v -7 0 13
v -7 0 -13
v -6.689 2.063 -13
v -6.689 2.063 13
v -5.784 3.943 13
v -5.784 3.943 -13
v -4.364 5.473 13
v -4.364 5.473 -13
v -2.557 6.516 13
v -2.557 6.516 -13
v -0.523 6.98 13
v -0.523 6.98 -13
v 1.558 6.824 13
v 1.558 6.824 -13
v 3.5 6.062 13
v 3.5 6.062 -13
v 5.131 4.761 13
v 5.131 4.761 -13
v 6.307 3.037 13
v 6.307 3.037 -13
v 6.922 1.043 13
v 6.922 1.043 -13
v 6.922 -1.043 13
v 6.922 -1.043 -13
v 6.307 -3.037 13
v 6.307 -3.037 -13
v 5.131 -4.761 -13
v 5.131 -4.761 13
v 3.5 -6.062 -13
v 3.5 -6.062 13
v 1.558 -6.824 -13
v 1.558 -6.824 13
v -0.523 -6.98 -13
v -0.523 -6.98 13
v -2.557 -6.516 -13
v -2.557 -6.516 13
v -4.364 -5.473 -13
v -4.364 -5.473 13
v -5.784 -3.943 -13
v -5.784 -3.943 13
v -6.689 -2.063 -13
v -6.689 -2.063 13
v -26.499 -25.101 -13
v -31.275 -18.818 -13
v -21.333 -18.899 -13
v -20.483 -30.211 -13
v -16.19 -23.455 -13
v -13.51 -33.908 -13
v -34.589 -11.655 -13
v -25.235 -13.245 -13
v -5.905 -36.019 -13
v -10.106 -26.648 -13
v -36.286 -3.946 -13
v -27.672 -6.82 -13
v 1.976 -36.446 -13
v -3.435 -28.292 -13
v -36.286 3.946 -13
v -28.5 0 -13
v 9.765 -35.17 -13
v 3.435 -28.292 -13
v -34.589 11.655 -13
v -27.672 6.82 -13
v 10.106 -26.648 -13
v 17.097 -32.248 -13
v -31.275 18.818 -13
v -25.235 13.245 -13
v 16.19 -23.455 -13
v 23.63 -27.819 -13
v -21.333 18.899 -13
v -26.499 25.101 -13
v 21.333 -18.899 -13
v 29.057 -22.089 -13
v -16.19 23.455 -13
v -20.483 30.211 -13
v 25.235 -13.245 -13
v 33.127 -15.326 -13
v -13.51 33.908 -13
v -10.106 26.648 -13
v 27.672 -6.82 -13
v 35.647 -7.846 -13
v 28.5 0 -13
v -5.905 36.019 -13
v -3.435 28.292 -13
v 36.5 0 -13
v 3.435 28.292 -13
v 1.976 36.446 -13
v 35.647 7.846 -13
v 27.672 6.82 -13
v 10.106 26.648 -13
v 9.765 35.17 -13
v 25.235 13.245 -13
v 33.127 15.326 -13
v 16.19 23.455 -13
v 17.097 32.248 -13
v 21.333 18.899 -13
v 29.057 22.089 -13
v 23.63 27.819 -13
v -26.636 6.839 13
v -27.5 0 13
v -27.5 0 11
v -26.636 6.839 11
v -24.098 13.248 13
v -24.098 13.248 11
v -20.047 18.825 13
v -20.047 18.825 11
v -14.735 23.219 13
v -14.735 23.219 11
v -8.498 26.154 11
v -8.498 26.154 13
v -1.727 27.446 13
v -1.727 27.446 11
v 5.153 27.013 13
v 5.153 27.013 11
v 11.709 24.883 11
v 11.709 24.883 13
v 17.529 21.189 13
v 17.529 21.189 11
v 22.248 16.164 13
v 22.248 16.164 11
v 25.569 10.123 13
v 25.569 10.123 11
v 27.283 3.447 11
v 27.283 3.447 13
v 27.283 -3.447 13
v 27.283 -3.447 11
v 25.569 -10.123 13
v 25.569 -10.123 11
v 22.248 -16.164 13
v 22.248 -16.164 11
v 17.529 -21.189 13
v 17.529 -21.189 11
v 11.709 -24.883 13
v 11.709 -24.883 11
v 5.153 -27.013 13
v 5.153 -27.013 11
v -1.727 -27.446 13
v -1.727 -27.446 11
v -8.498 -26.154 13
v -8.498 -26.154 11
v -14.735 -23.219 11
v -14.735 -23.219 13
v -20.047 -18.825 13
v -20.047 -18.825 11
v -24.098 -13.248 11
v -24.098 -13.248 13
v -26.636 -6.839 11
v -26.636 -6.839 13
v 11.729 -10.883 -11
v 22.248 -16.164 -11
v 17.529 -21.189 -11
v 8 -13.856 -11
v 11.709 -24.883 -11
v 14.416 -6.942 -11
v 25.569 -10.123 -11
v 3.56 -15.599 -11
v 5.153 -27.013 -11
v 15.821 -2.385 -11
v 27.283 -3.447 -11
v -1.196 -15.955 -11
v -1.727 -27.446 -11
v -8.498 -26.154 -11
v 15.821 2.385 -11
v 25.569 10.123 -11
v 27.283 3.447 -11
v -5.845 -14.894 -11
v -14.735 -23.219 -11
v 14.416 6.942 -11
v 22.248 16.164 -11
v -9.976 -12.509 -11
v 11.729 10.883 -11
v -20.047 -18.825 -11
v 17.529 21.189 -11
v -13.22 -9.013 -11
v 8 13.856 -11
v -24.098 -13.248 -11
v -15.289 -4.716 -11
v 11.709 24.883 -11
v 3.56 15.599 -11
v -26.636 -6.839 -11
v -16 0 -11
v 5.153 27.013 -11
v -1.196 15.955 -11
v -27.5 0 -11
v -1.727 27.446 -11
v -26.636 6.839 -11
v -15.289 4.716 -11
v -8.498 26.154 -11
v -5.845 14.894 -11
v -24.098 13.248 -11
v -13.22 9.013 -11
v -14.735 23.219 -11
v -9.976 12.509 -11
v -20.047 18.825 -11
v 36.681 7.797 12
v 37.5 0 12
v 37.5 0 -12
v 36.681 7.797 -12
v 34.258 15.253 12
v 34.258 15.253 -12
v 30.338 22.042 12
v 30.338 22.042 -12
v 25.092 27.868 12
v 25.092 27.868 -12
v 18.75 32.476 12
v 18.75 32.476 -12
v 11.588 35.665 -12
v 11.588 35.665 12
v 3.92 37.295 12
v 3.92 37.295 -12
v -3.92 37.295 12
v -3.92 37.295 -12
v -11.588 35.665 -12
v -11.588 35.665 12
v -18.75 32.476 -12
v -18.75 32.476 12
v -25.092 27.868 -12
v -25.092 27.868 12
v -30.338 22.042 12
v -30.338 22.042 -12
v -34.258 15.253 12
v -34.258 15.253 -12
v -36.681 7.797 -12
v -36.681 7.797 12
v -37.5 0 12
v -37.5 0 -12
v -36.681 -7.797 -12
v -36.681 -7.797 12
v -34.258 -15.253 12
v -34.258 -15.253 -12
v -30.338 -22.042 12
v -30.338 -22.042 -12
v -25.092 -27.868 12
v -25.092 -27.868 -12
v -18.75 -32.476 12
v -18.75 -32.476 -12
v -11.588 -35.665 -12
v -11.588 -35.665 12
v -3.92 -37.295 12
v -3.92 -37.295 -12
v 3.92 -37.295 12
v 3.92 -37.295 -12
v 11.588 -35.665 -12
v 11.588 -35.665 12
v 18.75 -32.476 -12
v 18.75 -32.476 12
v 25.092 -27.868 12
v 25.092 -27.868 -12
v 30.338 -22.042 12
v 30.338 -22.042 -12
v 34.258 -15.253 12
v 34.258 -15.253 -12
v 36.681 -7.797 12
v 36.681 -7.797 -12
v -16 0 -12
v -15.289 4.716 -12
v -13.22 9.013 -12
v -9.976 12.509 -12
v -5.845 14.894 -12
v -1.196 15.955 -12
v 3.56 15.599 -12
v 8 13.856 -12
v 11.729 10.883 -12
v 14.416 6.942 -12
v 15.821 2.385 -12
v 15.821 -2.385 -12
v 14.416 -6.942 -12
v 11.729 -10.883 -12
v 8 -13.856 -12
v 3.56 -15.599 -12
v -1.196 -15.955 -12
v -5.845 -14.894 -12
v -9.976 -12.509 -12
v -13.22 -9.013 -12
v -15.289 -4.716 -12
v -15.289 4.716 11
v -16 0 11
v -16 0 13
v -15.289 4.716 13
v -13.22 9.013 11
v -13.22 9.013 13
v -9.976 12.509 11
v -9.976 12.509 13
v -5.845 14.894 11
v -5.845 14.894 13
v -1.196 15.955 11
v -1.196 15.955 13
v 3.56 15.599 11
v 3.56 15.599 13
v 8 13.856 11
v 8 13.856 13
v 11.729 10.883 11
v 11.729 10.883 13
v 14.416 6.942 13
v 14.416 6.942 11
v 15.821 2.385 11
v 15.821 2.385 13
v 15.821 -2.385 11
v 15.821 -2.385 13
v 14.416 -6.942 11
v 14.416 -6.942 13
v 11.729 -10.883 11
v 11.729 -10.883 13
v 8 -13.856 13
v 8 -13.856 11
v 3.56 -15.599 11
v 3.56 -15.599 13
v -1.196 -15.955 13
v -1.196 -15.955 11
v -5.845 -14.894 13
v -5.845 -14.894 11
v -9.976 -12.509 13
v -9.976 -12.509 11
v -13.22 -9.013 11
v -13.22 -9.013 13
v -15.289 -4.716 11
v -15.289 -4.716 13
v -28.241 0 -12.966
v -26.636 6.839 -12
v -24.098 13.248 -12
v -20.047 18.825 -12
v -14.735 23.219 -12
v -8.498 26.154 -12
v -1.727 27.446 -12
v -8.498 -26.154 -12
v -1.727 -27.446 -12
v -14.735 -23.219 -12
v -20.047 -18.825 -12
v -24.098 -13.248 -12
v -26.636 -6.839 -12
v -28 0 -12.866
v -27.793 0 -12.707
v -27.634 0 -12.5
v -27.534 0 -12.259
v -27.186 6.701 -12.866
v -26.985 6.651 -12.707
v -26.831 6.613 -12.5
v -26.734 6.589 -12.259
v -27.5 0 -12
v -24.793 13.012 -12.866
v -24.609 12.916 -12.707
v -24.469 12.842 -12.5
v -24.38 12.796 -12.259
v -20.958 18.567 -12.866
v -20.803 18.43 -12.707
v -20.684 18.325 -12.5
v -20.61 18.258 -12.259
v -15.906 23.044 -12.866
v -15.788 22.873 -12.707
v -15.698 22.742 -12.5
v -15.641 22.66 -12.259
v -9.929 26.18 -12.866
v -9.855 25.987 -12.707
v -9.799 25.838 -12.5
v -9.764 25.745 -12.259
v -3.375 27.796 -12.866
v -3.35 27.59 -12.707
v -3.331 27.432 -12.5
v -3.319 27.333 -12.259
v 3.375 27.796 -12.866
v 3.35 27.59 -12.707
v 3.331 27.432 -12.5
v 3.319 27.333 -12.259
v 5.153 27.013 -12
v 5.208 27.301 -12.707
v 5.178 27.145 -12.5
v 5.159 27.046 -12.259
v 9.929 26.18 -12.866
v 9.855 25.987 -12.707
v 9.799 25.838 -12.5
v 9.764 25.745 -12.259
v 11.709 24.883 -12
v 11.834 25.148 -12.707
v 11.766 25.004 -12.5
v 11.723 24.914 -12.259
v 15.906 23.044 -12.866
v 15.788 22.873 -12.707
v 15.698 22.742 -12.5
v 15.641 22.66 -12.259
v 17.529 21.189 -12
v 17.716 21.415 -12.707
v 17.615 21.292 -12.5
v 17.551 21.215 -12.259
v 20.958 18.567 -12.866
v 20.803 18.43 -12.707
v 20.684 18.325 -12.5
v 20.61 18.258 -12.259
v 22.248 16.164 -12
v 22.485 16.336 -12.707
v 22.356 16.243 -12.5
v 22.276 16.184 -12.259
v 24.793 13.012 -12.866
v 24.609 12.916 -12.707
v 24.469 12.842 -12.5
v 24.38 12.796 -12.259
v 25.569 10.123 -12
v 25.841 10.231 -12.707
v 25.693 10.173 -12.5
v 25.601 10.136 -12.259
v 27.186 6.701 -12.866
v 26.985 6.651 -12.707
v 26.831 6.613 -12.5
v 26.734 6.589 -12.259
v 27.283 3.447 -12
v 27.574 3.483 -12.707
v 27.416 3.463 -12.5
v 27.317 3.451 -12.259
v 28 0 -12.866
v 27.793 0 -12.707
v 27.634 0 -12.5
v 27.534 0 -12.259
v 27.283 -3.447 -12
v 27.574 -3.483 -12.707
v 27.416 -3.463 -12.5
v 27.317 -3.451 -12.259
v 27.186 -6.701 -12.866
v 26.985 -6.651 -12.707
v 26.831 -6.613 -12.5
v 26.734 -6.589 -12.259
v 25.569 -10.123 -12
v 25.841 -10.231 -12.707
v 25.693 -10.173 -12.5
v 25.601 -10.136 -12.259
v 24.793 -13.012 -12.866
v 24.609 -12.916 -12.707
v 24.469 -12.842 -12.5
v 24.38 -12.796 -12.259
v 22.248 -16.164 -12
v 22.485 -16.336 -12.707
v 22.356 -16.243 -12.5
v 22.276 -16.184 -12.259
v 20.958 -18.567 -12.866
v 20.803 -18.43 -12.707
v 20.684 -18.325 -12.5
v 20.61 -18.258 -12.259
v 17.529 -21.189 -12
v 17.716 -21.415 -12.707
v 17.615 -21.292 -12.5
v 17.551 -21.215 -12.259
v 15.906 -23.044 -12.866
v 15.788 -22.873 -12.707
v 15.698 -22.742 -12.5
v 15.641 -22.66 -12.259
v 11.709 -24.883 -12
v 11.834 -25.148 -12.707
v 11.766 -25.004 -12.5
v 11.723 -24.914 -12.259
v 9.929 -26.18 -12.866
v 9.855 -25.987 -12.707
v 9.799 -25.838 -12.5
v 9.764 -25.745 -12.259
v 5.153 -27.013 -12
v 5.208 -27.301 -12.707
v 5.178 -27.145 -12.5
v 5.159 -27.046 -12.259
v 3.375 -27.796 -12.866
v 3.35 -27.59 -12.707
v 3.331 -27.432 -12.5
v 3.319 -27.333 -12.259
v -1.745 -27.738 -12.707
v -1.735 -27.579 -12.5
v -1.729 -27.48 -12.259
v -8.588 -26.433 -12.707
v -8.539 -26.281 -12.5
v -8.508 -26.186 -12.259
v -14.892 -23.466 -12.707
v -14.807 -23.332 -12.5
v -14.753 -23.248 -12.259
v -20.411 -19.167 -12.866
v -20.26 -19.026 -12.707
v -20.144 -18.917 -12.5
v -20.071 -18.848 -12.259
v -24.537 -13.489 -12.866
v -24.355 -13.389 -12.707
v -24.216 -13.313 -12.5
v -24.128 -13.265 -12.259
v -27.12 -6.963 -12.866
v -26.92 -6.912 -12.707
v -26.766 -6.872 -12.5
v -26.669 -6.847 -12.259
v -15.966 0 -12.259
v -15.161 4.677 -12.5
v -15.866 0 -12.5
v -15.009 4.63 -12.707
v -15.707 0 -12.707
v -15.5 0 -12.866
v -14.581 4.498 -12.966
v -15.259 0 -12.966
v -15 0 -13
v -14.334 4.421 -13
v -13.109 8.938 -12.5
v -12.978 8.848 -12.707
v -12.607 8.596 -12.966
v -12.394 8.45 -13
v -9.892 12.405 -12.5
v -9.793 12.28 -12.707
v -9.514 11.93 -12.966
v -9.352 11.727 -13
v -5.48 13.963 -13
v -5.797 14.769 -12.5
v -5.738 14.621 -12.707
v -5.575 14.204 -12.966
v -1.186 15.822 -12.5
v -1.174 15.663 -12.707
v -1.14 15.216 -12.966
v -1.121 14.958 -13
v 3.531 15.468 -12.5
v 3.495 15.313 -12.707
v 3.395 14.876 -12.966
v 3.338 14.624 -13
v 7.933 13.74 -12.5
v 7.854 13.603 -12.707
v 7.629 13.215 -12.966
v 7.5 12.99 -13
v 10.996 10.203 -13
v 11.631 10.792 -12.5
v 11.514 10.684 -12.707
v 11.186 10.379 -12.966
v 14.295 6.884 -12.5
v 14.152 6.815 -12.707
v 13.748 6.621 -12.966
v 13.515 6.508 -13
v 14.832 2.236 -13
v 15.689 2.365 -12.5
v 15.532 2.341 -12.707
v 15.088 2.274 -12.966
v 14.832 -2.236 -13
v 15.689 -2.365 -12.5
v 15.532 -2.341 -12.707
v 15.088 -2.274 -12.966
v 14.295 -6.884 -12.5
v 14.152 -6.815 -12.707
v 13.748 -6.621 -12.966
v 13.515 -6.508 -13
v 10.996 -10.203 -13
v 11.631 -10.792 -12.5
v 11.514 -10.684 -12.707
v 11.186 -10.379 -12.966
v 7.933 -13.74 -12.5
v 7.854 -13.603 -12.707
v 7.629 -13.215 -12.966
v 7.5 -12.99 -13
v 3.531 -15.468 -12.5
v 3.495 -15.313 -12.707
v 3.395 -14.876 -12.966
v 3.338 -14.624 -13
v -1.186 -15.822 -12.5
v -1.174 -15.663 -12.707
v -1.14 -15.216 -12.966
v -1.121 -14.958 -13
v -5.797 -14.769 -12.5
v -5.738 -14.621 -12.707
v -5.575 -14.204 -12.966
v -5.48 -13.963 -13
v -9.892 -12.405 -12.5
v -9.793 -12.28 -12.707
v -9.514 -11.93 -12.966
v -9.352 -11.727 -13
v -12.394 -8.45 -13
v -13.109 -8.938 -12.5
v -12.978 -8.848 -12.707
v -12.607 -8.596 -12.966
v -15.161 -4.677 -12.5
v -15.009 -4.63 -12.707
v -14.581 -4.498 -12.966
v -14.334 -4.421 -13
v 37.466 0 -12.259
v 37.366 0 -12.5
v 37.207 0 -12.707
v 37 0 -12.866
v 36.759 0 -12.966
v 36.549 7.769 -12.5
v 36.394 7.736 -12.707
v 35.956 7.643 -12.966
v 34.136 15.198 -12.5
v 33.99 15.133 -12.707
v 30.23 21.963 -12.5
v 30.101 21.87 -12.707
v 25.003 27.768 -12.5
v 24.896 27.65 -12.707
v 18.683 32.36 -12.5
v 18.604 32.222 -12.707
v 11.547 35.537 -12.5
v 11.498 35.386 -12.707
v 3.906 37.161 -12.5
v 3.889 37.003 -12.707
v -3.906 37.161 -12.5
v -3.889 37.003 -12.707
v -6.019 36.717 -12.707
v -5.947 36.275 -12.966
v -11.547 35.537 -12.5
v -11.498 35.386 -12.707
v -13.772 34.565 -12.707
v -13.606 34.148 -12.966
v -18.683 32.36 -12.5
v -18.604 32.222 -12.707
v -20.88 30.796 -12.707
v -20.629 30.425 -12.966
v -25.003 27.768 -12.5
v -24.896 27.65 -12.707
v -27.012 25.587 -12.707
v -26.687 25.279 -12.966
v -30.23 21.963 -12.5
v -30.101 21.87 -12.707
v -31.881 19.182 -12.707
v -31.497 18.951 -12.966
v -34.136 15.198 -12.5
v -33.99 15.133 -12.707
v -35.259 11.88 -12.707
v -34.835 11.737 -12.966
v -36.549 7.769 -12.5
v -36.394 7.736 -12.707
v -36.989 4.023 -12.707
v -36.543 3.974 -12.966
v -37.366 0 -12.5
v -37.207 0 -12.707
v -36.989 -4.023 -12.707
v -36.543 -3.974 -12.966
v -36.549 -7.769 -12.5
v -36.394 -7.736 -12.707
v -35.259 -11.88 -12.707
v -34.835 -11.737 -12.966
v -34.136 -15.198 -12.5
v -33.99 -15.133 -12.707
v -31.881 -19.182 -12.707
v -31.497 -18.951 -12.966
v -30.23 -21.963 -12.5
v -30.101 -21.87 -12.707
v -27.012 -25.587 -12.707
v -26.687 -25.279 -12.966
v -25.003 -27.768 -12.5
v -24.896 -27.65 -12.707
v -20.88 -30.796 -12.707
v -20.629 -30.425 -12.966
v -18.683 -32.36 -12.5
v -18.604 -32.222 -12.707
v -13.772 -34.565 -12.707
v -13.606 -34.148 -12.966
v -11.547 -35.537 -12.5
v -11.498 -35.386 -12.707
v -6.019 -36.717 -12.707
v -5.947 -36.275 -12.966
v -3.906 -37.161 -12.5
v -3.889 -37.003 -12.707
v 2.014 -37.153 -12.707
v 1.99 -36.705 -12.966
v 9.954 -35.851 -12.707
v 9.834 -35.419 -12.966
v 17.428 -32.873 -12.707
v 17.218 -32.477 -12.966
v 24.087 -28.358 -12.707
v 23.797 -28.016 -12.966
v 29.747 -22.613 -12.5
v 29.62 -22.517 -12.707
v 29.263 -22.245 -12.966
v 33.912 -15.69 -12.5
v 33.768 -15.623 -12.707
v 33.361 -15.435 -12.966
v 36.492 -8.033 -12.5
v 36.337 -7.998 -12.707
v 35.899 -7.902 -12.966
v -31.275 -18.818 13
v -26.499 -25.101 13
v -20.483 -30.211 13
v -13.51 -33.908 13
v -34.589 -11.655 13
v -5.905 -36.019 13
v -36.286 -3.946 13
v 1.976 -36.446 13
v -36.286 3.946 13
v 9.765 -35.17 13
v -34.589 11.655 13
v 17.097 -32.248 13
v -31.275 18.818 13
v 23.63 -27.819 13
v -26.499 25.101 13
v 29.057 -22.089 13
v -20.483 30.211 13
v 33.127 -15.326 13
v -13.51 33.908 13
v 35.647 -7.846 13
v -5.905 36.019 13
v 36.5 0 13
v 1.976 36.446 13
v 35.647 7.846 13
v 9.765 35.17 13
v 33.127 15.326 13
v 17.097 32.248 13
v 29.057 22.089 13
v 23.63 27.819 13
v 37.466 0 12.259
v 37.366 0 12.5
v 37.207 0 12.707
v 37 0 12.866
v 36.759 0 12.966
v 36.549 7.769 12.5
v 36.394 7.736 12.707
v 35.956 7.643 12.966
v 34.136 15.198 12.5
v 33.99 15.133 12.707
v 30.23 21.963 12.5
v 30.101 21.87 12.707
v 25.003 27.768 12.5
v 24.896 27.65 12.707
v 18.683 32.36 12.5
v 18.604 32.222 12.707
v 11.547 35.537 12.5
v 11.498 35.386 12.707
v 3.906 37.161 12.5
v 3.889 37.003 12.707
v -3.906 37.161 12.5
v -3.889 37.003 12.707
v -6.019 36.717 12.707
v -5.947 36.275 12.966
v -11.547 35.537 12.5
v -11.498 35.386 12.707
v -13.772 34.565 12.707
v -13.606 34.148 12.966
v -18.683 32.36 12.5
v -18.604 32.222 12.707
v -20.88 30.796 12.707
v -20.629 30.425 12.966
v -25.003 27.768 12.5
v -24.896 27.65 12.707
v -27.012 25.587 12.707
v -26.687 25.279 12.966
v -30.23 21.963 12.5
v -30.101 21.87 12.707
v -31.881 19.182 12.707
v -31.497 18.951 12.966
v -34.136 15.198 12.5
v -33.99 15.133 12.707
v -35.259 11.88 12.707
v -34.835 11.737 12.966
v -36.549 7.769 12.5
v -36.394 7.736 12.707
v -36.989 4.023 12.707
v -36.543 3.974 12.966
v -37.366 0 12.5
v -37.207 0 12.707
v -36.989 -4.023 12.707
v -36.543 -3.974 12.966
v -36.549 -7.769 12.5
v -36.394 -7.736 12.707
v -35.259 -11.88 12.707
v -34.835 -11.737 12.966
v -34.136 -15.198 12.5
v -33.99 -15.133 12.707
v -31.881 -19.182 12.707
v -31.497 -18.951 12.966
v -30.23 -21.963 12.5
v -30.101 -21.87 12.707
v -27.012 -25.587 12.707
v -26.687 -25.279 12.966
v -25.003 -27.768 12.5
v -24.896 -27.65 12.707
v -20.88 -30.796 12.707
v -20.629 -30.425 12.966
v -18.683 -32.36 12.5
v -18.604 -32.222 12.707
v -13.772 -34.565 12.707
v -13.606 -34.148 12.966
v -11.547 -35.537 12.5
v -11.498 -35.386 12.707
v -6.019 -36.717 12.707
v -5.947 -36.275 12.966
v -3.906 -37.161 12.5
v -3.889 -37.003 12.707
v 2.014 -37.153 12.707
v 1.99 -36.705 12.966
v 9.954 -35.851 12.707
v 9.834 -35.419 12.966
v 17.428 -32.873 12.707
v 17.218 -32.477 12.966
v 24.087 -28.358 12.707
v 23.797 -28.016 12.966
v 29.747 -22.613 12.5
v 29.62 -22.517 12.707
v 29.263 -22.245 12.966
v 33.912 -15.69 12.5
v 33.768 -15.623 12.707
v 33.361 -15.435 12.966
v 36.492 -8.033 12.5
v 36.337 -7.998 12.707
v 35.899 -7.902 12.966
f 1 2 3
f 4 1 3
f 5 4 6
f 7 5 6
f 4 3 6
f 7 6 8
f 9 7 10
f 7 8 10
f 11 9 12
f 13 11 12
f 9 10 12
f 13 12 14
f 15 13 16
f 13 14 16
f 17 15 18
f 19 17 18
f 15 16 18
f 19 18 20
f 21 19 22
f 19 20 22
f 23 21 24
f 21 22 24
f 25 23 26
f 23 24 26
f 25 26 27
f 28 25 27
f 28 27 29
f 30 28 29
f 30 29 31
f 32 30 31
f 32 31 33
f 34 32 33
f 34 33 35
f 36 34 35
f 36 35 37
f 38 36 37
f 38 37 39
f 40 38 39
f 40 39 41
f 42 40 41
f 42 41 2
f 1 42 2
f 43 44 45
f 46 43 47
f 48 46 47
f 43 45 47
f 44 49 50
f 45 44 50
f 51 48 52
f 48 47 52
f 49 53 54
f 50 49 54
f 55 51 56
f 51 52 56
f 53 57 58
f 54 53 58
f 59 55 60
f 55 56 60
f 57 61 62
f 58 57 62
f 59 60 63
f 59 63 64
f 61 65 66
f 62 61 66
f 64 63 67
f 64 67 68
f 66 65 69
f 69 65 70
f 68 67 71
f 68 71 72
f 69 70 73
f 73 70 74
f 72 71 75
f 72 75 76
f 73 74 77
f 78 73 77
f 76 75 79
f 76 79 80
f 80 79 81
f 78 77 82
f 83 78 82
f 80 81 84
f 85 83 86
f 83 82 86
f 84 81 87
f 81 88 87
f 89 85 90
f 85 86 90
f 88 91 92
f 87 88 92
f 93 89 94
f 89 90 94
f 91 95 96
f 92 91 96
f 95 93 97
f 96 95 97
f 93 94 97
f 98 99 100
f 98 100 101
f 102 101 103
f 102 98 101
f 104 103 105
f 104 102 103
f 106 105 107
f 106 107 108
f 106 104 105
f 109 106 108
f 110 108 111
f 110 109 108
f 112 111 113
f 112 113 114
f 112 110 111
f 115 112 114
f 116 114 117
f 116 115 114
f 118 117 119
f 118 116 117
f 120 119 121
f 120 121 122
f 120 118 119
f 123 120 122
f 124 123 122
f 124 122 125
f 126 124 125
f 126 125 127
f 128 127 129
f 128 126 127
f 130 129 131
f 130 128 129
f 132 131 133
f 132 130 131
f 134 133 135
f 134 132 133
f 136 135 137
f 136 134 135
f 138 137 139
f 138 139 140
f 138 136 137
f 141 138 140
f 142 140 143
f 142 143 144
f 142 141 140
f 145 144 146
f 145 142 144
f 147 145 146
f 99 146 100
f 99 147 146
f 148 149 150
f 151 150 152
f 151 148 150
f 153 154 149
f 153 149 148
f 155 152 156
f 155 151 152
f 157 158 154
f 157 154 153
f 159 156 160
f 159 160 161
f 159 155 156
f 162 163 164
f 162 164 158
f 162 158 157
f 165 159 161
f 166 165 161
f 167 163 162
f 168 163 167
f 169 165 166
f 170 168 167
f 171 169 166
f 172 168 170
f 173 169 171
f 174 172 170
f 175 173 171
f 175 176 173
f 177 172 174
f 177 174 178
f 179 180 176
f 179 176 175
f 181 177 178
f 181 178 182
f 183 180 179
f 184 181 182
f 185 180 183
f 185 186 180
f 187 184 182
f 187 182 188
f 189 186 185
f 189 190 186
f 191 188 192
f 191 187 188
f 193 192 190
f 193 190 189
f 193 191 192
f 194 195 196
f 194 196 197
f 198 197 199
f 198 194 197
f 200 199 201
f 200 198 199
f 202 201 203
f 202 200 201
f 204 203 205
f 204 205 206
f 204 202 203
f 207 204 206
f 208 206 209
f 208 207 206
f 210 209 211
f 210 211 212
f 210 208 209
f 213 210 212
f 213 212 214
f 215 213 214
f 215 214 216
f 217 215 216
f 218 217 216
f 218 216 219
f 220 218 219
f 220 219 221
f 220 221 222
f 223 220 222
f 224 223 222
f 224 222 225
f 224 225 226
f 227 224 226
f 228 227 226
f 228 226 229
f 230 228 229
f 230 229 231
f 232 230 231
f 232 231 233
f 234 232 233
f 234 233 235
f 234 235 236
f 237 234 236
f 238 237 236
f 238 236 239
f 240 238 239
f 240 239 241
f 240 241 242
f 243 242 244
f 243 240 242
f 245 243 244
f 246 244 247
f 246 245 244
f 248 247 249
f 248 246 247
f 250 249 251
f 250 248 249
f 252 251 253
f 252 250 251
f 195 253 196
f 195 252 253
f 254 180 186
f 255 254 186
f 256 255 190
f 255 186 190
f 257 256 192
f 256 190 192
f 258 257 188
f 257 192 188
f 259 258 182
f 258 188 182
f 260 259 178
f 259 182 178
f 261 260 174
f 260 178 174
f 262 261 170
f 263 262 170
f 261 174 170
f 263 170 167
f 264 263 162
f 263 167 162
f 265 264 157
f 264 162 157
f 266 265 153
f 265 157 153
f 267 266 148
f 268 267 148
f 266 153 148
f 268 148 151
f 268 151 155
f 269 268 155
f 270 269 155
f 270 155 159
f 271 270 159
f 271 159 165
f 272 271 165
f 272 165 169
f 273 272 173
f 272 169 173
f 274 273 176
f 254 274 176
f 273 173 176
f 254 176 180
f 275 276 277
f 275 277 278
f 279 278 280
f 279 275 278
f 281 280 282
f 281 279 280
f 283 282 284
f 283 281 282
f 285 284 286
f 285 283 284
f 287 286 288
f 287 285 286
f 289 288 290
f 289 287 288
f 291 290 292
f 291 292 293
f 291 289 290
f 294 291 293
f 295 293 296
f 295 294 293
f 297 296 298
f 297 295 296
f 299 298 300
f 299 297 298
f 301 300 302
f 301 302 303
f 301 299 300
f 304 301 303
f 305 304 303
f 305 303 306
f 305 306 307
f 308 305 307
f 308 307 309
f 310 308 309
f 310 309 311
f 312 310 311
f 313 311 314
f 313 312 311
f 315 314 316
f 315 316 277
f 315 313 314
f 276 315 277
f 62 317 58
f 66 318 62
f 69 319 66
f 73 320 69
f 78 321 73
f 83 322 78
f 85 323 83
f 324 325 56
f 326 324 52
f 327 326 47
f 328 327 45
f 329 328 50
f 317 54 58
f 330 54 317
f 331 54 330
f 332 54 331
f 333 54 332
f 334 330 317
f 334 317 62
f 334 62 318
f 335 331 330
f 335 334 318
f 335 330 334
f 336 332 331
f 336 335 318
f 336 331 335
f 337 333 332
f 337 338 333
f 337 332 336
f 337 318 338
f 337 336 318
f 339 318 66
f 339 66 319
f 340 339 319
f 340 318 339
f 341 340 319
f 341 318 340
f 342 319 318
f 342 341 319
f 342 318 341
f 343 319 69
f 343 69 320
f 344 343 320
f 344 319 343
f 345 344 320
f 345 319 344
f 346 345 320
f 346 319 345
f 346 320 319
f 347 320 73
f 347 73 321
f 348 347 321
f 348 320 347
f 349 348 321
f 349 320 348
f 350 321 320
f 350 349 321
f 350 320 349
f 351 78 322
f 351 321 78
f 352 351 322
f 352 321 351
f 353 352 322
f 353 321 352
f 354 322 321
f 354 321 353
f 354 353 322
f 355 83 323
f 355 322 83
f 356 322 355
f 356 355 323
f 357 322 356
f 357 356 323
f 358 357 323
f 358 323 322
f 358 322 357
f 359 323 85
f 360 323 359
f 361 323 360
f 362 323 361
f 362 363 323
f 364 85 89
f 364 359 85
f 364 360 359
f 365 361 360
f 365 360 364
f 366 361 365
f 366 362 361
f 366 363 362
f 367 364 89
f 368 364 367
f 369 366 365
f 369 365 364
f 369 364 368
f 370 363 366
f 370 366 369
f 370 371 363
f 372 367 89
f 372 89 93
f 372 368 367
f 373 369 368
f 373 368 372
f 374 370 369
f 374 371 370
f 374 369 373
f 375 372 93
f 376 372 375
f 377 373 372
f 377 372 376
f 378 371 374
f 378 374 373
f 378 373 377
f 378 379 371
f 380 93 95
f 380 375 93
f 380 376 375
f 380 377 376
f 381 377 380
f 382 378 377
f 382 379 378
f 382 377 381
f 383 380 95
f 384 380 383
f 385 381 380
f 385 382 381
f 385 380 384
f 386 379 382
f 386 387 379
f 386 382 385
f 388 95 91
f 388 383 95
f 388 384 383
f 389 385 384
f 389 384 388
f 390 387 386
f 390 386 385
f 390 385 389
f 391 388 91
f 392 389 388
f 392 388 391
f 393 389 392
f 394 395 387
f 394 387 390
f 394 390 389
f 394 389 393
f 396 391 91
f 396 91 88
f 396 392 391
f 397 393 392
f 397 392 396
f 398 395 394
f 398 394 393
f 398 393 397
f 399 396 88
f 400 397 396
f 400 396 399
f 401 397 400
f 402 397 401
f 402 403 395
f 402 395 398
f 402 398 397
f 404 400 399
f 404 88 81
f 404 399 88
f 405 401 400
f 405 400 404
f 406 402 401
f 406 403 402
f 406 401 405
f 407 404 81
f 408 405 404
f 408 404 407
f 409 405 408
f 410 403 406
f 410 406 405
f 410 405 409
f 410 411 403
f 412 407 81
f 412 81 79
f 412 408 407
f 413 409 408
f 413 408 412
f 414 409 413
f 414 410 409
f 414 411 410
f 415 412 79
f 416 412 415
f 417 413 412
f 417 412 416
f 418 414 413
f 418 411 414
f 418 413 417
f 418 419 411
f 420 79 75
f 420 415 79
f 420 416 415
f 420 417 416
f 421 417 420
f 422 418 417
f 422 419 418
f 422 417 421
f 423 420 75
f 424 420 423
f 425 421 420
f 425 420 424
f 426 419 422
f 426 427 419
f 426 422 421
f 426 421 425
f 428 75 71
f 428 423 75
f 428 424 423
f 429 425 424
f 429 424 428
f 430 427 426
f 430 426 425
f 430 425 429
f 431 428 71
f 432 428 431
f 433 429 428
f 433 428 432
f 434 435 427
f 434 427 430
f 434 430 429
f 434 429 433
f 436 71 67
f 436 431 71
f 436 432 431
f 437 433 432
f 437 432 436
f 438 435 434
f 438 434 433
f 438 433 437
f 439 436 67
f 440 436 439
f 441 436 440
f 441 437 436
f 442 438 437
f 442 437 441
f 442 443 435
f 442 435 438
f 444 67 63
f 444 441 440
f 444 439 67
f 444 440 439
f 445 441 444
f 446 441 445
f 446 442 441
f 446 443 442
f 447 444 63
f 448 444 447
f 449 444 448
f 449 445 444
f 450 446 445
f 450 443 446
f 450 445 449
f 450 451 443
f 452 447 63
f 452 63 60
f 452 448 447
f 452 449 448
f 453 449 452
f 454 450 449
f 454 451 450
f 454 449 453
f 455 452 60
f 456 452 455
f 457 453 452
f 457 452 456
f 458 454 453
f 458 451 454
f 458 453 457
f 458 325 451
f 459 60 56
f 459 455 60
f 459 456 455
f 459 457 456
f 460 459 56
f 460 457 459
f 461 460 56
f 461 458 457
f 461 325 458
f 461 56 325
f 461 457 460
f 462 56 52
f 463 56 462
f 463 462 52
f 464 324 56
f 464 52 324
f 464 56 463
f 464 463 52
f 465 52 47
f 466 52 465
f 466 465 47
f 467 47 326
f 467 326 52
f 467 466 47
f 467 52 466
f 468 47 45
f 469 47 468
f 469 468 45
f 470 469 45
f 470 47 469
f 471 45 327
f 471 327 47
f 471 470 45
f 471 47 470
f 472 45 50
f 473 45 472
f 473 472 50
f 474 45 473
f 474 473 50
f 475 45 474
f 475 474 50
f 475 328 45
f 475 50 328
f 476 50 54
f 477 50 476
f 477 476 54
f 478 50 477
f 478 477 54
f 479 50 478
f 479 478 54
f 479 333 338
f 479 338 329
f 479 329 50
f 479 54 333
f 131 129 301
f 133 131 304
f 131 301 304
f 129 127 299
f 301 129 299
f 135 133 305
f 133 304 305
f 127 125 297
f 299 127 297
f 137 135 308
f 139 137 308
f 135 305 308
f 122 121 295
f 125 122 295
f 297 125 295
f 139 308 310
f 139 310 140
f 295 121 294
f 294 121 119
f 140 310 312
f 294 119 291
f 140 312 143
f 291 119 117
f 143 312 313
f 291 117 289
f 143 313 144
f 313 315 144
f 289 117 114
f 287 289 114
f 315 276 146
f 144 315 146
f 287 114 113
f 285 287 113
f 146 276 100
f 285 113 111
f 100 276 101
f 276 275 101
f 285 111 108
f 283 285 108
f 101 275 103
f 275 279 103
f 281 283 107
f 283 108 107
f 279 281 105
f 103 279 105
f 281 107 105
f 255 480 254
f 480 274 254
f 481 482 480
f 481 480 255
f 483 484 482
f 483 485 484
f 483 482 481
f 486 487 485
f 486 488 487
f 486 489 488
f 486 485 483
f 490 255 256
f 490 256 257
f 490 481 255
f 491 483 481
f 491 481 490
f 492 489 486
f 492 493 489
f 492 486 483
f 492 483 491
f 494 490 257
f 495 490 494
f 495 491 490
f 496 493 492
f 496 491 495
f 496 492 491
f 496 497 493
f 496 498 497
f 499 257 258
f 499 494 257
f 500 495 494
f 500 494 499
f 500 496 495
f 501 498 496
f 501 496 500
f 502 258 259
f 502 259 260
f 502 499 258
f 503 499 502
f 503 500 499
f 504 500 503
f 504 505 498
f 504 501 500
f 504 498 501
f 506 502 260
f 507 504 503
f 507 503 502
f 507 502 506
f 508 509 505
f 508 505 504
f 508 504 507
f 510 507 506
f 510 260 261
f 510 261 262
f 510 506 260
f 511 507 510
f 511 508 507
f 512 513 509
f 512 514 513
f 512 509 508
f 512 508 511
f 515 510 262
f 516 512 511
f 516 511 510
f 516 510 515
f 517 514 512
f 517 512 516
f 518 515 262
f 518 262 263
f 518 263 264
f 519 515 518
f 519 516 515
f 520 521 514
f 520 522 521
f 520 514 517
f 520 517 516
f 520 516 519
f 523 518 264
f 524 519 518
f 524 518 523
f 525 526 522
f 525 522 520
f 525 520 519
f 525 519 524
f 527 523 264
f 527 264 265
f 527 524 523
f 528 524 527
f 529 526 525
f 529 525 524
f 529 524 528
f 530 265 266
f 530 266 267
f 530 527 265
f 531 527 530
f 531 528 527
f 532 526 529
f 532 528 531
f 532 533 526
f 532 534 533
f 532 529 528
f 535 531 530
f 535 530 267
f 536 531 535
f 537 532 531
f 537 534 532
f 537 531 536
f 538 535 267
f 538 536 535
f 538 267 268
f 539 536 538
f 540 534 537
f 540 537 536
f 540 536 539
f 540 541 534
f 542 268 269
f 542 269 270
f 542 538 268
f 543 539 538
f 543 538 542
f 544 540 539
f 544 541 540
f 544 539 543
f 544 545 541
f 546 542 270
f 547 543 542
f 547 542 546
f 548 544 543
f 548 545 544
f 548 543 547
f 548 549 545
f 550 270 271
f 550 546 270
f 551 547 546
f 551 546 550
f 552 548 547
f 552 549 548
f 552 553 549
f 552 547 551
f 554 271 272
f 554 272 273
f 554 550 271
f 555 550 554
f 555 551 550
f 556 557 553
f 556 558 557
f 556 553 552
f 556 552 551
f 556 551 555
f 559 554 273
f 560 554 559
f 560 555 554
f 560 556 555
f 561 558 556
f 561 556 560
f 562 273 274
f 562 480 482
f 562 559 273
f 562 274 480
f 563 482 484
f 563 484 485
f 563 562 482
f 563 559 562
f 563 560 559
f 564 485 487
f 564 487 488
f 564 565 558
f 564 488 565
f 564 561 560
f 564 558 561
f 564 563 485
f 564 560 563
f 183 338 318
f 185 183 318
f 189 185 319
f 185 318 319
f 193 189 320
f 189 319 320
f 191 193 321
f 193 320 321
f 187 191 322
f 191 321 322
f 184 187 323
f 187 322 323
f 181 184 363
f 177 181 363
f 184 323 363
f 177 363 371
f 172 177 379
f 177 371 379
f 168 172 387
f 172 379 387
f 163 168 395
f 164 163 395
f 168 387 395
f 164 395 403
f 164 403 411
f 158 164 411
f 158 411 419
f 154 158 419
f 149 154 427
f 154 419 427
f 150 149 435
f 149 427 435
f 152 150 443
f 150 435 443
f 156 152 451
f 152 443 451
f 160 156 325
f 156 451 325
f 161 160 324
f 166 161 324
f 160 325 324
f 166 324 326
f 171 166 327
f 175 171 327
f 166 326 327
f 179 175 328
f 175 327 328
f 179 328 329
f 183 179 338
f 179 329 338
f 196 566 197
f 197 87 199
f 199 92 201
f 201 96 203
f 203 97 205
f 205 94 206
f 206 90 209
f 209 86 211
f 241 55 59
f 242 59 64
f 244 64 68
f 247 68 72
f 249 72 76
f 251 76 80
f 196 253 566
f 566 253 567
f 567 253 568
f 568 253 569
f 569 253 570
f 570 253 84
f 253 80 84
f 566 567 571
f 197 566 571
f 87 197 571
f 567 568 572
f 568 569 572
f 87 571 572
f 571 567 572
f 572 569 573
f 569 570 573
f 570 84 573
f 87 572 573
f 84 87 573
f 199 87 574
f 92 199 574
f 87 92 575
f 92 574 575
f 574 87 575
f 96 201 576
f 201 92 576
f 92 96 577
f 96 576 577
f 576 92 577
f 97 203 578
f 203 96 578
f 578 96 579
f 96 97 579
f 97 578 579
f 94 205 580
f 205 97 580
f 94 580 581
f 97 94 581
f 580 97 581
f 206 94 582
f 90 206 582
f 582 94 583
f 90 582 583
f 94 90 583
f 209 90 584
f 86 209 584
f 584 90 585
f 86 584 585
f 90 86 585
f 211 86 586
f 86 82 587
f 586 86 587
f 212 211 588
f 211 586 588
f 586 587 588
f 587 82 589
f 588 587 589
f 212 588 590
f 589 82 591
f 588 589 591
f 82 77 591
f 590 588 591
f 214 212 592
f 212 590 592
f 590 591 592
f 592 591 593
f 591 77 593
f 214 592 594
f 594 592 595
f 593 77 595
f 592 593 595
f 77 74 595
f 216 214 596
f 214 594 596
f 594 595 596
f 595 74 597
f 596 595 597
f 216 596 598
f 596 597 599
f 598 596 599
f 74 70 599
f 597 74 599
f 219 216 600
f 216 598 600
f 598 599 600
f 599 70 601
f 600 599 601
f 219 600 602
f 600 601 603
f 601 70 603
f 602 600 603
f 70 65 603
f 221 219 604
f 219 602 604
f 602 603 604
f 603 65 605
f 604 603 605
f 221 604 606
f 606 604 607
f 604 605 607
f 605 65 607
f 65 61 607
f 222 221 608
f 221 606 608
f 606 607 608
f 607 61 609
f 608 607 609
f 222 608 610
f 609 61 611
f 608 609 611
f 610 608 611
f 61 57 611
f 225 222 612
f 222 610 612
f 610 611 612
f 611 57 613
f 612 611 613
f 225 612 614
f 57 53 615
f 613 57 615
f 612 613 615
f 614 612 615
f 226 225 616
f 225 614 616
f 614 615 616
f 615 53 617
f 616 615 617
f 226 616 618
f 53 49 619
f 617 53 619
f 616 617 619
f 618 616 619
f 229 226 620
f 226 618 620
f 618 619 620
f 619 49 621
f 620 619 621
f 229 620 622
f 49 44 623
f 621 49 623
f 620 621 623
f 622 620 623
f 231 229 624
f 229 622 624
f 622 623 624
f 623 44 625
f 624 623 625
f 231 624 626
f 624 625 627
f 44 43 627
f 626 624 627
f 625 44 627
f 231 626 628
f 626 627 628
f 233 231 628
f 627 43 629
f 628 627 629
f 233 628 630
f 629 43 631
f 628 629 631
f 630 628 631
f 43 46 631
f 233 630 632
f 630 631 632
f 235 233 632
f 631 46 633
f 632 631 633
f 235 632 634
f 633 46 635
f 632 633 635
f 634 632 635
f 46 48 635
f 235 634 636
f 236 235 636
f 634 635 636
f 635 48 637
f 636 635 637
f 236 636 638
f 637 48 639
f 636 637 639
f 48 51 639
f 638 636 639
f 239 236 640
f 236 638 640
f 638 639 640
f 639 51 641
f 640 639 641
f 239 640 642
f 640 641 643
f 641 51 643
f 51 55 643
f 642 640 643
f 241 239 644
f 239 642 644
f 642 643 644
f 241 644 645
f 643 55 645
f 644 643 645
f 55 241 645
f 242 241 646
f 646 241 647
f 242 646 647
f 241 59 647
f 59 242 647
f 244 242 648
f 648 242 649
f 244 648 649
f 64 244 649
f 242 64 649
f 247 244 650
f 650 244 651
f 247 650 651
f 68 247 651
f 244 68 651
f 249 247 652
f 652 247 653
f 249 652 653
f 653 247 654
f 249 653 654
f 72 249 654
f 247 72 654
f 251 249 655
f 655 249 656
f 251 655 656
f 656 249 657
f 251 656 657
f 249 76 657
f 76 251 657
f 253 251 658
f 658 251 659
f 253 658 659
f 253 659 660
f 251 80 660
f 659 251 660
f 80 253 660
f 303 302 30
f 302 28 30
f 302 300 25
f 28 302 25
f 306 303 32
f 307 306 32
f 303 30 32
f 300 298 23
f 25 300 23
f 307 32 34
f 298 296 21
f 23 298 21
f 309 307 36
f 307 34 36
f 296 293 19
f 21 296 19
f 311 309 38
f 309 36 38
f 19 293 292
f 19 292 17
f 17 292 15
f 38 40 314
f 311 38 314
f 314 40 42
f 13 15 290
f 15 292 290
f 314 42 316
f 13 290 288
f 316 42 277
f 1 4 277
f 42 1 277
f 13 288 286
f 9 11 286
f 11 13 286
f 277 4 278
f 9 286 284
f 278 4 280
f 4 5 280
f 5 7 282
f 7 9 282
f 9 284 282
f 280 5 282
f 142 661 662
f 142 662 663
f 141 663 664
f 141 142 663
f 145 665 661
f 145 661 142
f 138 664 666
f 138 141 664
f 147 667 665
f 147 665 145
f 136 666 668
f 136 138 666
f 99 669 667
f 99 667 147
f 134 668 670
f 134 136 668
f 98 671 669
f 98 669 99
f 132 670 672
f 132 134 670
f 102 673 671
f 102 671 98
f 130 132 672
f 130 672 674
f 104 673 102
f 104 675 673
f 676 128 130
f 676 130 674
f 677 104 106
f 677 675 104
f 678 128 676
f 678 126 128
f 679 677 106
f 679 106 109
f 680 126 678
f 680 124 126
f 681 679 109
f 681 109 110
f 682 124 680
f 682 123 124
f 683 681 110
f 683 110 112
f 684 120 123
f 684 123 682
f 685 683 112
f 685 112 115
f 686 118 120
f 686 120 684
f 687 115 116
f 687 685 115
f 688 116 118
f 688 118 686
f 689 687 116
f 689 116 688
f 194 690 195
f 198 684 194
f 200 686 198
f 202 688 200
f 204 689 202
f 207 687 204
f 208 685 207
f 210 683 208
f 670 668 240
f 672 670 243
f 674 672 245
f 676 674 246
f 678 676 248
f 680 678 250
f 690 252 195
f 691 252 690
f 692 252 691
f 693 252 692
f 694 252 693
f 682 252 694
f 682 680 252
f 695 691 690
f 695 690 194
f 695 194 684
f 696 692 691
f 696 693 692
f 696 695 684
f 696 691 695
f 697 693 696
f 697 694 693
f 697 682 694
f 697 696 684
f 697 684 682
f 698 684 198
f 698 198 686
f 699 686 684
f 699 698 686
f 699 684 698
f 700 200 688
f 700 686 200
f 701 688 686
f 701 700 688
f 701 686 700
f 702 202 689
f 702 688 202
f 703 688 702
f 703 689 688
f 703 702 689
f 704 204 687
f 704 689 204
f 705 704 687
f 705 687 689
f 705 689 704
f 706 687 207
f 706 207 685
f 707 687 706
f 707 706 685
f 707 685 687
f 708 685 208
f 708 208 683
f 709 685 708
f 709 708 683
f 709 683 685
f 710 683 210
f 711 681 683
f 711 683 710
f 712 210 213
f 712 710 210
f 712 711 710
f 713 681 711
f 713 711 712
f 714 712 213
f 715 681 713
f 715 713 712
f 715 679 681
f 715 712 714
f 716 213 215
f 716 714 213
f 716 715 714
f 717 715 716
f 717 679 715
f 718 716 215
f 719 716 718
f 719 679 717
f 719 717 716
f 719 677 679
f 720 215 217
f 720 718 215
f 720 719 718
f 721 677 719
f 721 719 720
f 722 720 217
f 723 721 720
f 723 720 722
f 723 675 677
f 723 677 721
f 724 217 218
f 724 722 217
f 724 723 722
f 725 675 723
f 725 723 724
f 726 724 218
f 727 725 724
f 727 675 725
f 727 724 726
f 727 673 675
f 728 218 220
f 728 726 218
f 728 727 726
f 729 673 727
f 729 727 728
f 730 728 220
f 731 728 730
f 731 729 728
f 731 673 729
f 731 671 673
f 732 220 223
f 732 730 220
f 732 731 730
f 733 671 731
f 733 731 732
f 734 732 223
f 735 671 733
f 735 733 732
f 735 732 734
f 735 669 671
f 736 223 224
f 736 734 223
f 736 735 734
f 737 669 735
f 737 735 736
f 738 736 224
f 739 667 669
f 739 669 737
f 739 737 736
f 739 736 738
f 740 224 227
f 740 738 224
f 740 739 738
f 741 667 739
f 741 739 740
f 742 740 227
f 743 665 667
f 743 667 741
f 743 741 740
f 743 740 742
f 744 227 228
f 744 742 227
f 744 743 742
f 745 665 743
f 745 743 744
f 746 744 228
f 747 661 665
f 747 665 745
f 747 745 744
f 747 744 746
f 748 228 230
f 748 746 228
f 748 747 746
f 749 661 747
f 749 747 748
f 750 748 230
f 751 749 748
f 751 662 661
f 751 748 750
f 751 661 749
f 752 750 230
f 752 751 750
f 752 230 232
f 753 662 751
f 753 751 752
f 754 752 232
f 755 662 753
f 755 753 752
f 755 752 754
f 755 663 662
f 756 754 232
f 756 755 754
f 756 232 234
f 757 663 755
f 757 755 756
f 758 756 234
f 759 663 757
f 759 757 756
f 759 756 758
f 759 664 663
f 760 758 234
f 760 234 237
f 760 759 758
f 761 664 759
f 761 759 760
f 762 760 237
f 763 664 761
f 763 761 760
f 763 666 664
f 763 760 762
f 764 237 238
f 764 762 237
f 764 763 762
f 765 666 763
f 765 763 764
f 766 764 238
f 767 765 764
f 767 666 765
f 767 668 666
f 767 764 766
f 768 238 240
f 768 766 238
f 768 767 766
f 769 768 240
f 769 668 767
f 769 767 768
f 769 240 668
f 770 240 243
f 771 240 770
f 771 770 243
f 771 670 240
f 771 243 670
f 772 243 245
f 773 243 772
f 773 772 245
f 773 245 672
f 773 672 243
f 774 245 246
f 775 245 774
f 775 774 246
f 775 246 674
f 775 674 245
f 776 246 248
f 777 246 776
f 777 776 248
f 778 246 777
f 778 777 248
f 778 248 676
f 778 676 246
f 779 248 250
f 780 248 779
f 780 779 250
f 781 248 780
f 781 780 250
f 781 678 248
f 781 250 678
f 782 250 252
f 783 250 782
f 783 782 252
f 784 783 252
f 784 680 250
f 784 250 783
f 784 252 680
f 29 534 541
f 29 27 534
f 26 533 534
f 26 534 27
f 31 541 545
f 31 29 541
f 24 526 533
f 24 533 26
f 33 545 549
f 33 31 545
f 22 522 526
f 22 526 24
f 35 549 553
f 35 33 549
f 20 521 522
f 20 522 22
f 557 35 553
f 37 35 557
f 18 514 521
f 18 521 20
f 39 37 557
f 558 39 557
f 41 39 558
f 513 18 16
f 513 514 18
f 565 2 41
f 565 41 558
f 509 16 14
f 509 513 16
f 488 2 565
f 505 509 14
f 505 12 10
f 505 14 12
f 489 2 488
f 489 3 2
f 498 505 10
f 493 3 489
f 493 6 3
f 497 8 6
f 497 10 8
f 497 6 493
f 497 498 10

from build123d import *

# Parameters (mm, degrees)
SKETCH1_R           = 37.5
BOSS_EXTRUDE1_DEPTH = 13
SKETCH4_R           = 27.5
CUT_EXTRUDE1_DEPTH  = 2
SKETCH5_R           = 16
BOSS_EXTRUDE2_DEPTH = 2
SKETCH6_R           = 7
CUT_EXTRUDE2_DEPTH  = 27
FILLET1_R           = 1


with BuildPart() as part:
    # Sketch1 → Boss-Extrude1 (new body, symmetric)
    with BuildSketch(Plane.XY):
        Circle(SKETCH1_R)
    extrude(amount=BOSS_EXTRUDE1_DEPTH, both=True)

    # Sketch4 → Cut-Extrude1 (cut)
    with BuildSketch(Plane(origin=(0, 0, -13), x_dir=(-1, 0, 0), z_dir=(0, 0, -1))):
        Circle(SKETCH4_R)
    cut_extrude1 = extrude(amount=-CUT_EXTRUDE1_DEPTH, mode=Mode.SUBTRACT)

    # Mirror1: Cut-Extrude1 across plane
    add(cut_extrude1.mirror(Plane.XY), mode=Mode.SUBTRACT)

    # Sketch5 → Boss-Extrude2 (add)
    with BuildSketch(Plane(origin=(0, 0, -11), x_dir=(-1, 0, 0), z_dir=(0, 0, -1))):
        Circle(SKETCH5_R)
    boss_extrude2 = extrude(amount=BOSS_EXTRUDE2_DEPTH)

    # Mirror2: Boss-Extrude2 across plane
    add(boss_extrude2.mirror(Plane.XY))

    # Sketch6 → Cut-Extrude2 (cut, through all)
    with BuildSketch(Plane(origin=(0, 0, -13), x_dir=(-1, 0, 0), z_dir=(0, 0, -1))):
        Circle(SKETCH6_R)
    extrude(amount=-CUT_EXTRUDE2_DEPTH, mode=Mode.SUBTRACT)

    # Fillet1
    fillet1_edges = [part.edges().sort_by_distance(p)[0] for p in [
        (16, 0, -13),
        (-37.5, 0, 13),
        (-37.5, 0, -13),
        (27.5, 0, -13),
    ]]
    fillet(fillet1_edges, radius=FILLET1_R)


solid = part.part
